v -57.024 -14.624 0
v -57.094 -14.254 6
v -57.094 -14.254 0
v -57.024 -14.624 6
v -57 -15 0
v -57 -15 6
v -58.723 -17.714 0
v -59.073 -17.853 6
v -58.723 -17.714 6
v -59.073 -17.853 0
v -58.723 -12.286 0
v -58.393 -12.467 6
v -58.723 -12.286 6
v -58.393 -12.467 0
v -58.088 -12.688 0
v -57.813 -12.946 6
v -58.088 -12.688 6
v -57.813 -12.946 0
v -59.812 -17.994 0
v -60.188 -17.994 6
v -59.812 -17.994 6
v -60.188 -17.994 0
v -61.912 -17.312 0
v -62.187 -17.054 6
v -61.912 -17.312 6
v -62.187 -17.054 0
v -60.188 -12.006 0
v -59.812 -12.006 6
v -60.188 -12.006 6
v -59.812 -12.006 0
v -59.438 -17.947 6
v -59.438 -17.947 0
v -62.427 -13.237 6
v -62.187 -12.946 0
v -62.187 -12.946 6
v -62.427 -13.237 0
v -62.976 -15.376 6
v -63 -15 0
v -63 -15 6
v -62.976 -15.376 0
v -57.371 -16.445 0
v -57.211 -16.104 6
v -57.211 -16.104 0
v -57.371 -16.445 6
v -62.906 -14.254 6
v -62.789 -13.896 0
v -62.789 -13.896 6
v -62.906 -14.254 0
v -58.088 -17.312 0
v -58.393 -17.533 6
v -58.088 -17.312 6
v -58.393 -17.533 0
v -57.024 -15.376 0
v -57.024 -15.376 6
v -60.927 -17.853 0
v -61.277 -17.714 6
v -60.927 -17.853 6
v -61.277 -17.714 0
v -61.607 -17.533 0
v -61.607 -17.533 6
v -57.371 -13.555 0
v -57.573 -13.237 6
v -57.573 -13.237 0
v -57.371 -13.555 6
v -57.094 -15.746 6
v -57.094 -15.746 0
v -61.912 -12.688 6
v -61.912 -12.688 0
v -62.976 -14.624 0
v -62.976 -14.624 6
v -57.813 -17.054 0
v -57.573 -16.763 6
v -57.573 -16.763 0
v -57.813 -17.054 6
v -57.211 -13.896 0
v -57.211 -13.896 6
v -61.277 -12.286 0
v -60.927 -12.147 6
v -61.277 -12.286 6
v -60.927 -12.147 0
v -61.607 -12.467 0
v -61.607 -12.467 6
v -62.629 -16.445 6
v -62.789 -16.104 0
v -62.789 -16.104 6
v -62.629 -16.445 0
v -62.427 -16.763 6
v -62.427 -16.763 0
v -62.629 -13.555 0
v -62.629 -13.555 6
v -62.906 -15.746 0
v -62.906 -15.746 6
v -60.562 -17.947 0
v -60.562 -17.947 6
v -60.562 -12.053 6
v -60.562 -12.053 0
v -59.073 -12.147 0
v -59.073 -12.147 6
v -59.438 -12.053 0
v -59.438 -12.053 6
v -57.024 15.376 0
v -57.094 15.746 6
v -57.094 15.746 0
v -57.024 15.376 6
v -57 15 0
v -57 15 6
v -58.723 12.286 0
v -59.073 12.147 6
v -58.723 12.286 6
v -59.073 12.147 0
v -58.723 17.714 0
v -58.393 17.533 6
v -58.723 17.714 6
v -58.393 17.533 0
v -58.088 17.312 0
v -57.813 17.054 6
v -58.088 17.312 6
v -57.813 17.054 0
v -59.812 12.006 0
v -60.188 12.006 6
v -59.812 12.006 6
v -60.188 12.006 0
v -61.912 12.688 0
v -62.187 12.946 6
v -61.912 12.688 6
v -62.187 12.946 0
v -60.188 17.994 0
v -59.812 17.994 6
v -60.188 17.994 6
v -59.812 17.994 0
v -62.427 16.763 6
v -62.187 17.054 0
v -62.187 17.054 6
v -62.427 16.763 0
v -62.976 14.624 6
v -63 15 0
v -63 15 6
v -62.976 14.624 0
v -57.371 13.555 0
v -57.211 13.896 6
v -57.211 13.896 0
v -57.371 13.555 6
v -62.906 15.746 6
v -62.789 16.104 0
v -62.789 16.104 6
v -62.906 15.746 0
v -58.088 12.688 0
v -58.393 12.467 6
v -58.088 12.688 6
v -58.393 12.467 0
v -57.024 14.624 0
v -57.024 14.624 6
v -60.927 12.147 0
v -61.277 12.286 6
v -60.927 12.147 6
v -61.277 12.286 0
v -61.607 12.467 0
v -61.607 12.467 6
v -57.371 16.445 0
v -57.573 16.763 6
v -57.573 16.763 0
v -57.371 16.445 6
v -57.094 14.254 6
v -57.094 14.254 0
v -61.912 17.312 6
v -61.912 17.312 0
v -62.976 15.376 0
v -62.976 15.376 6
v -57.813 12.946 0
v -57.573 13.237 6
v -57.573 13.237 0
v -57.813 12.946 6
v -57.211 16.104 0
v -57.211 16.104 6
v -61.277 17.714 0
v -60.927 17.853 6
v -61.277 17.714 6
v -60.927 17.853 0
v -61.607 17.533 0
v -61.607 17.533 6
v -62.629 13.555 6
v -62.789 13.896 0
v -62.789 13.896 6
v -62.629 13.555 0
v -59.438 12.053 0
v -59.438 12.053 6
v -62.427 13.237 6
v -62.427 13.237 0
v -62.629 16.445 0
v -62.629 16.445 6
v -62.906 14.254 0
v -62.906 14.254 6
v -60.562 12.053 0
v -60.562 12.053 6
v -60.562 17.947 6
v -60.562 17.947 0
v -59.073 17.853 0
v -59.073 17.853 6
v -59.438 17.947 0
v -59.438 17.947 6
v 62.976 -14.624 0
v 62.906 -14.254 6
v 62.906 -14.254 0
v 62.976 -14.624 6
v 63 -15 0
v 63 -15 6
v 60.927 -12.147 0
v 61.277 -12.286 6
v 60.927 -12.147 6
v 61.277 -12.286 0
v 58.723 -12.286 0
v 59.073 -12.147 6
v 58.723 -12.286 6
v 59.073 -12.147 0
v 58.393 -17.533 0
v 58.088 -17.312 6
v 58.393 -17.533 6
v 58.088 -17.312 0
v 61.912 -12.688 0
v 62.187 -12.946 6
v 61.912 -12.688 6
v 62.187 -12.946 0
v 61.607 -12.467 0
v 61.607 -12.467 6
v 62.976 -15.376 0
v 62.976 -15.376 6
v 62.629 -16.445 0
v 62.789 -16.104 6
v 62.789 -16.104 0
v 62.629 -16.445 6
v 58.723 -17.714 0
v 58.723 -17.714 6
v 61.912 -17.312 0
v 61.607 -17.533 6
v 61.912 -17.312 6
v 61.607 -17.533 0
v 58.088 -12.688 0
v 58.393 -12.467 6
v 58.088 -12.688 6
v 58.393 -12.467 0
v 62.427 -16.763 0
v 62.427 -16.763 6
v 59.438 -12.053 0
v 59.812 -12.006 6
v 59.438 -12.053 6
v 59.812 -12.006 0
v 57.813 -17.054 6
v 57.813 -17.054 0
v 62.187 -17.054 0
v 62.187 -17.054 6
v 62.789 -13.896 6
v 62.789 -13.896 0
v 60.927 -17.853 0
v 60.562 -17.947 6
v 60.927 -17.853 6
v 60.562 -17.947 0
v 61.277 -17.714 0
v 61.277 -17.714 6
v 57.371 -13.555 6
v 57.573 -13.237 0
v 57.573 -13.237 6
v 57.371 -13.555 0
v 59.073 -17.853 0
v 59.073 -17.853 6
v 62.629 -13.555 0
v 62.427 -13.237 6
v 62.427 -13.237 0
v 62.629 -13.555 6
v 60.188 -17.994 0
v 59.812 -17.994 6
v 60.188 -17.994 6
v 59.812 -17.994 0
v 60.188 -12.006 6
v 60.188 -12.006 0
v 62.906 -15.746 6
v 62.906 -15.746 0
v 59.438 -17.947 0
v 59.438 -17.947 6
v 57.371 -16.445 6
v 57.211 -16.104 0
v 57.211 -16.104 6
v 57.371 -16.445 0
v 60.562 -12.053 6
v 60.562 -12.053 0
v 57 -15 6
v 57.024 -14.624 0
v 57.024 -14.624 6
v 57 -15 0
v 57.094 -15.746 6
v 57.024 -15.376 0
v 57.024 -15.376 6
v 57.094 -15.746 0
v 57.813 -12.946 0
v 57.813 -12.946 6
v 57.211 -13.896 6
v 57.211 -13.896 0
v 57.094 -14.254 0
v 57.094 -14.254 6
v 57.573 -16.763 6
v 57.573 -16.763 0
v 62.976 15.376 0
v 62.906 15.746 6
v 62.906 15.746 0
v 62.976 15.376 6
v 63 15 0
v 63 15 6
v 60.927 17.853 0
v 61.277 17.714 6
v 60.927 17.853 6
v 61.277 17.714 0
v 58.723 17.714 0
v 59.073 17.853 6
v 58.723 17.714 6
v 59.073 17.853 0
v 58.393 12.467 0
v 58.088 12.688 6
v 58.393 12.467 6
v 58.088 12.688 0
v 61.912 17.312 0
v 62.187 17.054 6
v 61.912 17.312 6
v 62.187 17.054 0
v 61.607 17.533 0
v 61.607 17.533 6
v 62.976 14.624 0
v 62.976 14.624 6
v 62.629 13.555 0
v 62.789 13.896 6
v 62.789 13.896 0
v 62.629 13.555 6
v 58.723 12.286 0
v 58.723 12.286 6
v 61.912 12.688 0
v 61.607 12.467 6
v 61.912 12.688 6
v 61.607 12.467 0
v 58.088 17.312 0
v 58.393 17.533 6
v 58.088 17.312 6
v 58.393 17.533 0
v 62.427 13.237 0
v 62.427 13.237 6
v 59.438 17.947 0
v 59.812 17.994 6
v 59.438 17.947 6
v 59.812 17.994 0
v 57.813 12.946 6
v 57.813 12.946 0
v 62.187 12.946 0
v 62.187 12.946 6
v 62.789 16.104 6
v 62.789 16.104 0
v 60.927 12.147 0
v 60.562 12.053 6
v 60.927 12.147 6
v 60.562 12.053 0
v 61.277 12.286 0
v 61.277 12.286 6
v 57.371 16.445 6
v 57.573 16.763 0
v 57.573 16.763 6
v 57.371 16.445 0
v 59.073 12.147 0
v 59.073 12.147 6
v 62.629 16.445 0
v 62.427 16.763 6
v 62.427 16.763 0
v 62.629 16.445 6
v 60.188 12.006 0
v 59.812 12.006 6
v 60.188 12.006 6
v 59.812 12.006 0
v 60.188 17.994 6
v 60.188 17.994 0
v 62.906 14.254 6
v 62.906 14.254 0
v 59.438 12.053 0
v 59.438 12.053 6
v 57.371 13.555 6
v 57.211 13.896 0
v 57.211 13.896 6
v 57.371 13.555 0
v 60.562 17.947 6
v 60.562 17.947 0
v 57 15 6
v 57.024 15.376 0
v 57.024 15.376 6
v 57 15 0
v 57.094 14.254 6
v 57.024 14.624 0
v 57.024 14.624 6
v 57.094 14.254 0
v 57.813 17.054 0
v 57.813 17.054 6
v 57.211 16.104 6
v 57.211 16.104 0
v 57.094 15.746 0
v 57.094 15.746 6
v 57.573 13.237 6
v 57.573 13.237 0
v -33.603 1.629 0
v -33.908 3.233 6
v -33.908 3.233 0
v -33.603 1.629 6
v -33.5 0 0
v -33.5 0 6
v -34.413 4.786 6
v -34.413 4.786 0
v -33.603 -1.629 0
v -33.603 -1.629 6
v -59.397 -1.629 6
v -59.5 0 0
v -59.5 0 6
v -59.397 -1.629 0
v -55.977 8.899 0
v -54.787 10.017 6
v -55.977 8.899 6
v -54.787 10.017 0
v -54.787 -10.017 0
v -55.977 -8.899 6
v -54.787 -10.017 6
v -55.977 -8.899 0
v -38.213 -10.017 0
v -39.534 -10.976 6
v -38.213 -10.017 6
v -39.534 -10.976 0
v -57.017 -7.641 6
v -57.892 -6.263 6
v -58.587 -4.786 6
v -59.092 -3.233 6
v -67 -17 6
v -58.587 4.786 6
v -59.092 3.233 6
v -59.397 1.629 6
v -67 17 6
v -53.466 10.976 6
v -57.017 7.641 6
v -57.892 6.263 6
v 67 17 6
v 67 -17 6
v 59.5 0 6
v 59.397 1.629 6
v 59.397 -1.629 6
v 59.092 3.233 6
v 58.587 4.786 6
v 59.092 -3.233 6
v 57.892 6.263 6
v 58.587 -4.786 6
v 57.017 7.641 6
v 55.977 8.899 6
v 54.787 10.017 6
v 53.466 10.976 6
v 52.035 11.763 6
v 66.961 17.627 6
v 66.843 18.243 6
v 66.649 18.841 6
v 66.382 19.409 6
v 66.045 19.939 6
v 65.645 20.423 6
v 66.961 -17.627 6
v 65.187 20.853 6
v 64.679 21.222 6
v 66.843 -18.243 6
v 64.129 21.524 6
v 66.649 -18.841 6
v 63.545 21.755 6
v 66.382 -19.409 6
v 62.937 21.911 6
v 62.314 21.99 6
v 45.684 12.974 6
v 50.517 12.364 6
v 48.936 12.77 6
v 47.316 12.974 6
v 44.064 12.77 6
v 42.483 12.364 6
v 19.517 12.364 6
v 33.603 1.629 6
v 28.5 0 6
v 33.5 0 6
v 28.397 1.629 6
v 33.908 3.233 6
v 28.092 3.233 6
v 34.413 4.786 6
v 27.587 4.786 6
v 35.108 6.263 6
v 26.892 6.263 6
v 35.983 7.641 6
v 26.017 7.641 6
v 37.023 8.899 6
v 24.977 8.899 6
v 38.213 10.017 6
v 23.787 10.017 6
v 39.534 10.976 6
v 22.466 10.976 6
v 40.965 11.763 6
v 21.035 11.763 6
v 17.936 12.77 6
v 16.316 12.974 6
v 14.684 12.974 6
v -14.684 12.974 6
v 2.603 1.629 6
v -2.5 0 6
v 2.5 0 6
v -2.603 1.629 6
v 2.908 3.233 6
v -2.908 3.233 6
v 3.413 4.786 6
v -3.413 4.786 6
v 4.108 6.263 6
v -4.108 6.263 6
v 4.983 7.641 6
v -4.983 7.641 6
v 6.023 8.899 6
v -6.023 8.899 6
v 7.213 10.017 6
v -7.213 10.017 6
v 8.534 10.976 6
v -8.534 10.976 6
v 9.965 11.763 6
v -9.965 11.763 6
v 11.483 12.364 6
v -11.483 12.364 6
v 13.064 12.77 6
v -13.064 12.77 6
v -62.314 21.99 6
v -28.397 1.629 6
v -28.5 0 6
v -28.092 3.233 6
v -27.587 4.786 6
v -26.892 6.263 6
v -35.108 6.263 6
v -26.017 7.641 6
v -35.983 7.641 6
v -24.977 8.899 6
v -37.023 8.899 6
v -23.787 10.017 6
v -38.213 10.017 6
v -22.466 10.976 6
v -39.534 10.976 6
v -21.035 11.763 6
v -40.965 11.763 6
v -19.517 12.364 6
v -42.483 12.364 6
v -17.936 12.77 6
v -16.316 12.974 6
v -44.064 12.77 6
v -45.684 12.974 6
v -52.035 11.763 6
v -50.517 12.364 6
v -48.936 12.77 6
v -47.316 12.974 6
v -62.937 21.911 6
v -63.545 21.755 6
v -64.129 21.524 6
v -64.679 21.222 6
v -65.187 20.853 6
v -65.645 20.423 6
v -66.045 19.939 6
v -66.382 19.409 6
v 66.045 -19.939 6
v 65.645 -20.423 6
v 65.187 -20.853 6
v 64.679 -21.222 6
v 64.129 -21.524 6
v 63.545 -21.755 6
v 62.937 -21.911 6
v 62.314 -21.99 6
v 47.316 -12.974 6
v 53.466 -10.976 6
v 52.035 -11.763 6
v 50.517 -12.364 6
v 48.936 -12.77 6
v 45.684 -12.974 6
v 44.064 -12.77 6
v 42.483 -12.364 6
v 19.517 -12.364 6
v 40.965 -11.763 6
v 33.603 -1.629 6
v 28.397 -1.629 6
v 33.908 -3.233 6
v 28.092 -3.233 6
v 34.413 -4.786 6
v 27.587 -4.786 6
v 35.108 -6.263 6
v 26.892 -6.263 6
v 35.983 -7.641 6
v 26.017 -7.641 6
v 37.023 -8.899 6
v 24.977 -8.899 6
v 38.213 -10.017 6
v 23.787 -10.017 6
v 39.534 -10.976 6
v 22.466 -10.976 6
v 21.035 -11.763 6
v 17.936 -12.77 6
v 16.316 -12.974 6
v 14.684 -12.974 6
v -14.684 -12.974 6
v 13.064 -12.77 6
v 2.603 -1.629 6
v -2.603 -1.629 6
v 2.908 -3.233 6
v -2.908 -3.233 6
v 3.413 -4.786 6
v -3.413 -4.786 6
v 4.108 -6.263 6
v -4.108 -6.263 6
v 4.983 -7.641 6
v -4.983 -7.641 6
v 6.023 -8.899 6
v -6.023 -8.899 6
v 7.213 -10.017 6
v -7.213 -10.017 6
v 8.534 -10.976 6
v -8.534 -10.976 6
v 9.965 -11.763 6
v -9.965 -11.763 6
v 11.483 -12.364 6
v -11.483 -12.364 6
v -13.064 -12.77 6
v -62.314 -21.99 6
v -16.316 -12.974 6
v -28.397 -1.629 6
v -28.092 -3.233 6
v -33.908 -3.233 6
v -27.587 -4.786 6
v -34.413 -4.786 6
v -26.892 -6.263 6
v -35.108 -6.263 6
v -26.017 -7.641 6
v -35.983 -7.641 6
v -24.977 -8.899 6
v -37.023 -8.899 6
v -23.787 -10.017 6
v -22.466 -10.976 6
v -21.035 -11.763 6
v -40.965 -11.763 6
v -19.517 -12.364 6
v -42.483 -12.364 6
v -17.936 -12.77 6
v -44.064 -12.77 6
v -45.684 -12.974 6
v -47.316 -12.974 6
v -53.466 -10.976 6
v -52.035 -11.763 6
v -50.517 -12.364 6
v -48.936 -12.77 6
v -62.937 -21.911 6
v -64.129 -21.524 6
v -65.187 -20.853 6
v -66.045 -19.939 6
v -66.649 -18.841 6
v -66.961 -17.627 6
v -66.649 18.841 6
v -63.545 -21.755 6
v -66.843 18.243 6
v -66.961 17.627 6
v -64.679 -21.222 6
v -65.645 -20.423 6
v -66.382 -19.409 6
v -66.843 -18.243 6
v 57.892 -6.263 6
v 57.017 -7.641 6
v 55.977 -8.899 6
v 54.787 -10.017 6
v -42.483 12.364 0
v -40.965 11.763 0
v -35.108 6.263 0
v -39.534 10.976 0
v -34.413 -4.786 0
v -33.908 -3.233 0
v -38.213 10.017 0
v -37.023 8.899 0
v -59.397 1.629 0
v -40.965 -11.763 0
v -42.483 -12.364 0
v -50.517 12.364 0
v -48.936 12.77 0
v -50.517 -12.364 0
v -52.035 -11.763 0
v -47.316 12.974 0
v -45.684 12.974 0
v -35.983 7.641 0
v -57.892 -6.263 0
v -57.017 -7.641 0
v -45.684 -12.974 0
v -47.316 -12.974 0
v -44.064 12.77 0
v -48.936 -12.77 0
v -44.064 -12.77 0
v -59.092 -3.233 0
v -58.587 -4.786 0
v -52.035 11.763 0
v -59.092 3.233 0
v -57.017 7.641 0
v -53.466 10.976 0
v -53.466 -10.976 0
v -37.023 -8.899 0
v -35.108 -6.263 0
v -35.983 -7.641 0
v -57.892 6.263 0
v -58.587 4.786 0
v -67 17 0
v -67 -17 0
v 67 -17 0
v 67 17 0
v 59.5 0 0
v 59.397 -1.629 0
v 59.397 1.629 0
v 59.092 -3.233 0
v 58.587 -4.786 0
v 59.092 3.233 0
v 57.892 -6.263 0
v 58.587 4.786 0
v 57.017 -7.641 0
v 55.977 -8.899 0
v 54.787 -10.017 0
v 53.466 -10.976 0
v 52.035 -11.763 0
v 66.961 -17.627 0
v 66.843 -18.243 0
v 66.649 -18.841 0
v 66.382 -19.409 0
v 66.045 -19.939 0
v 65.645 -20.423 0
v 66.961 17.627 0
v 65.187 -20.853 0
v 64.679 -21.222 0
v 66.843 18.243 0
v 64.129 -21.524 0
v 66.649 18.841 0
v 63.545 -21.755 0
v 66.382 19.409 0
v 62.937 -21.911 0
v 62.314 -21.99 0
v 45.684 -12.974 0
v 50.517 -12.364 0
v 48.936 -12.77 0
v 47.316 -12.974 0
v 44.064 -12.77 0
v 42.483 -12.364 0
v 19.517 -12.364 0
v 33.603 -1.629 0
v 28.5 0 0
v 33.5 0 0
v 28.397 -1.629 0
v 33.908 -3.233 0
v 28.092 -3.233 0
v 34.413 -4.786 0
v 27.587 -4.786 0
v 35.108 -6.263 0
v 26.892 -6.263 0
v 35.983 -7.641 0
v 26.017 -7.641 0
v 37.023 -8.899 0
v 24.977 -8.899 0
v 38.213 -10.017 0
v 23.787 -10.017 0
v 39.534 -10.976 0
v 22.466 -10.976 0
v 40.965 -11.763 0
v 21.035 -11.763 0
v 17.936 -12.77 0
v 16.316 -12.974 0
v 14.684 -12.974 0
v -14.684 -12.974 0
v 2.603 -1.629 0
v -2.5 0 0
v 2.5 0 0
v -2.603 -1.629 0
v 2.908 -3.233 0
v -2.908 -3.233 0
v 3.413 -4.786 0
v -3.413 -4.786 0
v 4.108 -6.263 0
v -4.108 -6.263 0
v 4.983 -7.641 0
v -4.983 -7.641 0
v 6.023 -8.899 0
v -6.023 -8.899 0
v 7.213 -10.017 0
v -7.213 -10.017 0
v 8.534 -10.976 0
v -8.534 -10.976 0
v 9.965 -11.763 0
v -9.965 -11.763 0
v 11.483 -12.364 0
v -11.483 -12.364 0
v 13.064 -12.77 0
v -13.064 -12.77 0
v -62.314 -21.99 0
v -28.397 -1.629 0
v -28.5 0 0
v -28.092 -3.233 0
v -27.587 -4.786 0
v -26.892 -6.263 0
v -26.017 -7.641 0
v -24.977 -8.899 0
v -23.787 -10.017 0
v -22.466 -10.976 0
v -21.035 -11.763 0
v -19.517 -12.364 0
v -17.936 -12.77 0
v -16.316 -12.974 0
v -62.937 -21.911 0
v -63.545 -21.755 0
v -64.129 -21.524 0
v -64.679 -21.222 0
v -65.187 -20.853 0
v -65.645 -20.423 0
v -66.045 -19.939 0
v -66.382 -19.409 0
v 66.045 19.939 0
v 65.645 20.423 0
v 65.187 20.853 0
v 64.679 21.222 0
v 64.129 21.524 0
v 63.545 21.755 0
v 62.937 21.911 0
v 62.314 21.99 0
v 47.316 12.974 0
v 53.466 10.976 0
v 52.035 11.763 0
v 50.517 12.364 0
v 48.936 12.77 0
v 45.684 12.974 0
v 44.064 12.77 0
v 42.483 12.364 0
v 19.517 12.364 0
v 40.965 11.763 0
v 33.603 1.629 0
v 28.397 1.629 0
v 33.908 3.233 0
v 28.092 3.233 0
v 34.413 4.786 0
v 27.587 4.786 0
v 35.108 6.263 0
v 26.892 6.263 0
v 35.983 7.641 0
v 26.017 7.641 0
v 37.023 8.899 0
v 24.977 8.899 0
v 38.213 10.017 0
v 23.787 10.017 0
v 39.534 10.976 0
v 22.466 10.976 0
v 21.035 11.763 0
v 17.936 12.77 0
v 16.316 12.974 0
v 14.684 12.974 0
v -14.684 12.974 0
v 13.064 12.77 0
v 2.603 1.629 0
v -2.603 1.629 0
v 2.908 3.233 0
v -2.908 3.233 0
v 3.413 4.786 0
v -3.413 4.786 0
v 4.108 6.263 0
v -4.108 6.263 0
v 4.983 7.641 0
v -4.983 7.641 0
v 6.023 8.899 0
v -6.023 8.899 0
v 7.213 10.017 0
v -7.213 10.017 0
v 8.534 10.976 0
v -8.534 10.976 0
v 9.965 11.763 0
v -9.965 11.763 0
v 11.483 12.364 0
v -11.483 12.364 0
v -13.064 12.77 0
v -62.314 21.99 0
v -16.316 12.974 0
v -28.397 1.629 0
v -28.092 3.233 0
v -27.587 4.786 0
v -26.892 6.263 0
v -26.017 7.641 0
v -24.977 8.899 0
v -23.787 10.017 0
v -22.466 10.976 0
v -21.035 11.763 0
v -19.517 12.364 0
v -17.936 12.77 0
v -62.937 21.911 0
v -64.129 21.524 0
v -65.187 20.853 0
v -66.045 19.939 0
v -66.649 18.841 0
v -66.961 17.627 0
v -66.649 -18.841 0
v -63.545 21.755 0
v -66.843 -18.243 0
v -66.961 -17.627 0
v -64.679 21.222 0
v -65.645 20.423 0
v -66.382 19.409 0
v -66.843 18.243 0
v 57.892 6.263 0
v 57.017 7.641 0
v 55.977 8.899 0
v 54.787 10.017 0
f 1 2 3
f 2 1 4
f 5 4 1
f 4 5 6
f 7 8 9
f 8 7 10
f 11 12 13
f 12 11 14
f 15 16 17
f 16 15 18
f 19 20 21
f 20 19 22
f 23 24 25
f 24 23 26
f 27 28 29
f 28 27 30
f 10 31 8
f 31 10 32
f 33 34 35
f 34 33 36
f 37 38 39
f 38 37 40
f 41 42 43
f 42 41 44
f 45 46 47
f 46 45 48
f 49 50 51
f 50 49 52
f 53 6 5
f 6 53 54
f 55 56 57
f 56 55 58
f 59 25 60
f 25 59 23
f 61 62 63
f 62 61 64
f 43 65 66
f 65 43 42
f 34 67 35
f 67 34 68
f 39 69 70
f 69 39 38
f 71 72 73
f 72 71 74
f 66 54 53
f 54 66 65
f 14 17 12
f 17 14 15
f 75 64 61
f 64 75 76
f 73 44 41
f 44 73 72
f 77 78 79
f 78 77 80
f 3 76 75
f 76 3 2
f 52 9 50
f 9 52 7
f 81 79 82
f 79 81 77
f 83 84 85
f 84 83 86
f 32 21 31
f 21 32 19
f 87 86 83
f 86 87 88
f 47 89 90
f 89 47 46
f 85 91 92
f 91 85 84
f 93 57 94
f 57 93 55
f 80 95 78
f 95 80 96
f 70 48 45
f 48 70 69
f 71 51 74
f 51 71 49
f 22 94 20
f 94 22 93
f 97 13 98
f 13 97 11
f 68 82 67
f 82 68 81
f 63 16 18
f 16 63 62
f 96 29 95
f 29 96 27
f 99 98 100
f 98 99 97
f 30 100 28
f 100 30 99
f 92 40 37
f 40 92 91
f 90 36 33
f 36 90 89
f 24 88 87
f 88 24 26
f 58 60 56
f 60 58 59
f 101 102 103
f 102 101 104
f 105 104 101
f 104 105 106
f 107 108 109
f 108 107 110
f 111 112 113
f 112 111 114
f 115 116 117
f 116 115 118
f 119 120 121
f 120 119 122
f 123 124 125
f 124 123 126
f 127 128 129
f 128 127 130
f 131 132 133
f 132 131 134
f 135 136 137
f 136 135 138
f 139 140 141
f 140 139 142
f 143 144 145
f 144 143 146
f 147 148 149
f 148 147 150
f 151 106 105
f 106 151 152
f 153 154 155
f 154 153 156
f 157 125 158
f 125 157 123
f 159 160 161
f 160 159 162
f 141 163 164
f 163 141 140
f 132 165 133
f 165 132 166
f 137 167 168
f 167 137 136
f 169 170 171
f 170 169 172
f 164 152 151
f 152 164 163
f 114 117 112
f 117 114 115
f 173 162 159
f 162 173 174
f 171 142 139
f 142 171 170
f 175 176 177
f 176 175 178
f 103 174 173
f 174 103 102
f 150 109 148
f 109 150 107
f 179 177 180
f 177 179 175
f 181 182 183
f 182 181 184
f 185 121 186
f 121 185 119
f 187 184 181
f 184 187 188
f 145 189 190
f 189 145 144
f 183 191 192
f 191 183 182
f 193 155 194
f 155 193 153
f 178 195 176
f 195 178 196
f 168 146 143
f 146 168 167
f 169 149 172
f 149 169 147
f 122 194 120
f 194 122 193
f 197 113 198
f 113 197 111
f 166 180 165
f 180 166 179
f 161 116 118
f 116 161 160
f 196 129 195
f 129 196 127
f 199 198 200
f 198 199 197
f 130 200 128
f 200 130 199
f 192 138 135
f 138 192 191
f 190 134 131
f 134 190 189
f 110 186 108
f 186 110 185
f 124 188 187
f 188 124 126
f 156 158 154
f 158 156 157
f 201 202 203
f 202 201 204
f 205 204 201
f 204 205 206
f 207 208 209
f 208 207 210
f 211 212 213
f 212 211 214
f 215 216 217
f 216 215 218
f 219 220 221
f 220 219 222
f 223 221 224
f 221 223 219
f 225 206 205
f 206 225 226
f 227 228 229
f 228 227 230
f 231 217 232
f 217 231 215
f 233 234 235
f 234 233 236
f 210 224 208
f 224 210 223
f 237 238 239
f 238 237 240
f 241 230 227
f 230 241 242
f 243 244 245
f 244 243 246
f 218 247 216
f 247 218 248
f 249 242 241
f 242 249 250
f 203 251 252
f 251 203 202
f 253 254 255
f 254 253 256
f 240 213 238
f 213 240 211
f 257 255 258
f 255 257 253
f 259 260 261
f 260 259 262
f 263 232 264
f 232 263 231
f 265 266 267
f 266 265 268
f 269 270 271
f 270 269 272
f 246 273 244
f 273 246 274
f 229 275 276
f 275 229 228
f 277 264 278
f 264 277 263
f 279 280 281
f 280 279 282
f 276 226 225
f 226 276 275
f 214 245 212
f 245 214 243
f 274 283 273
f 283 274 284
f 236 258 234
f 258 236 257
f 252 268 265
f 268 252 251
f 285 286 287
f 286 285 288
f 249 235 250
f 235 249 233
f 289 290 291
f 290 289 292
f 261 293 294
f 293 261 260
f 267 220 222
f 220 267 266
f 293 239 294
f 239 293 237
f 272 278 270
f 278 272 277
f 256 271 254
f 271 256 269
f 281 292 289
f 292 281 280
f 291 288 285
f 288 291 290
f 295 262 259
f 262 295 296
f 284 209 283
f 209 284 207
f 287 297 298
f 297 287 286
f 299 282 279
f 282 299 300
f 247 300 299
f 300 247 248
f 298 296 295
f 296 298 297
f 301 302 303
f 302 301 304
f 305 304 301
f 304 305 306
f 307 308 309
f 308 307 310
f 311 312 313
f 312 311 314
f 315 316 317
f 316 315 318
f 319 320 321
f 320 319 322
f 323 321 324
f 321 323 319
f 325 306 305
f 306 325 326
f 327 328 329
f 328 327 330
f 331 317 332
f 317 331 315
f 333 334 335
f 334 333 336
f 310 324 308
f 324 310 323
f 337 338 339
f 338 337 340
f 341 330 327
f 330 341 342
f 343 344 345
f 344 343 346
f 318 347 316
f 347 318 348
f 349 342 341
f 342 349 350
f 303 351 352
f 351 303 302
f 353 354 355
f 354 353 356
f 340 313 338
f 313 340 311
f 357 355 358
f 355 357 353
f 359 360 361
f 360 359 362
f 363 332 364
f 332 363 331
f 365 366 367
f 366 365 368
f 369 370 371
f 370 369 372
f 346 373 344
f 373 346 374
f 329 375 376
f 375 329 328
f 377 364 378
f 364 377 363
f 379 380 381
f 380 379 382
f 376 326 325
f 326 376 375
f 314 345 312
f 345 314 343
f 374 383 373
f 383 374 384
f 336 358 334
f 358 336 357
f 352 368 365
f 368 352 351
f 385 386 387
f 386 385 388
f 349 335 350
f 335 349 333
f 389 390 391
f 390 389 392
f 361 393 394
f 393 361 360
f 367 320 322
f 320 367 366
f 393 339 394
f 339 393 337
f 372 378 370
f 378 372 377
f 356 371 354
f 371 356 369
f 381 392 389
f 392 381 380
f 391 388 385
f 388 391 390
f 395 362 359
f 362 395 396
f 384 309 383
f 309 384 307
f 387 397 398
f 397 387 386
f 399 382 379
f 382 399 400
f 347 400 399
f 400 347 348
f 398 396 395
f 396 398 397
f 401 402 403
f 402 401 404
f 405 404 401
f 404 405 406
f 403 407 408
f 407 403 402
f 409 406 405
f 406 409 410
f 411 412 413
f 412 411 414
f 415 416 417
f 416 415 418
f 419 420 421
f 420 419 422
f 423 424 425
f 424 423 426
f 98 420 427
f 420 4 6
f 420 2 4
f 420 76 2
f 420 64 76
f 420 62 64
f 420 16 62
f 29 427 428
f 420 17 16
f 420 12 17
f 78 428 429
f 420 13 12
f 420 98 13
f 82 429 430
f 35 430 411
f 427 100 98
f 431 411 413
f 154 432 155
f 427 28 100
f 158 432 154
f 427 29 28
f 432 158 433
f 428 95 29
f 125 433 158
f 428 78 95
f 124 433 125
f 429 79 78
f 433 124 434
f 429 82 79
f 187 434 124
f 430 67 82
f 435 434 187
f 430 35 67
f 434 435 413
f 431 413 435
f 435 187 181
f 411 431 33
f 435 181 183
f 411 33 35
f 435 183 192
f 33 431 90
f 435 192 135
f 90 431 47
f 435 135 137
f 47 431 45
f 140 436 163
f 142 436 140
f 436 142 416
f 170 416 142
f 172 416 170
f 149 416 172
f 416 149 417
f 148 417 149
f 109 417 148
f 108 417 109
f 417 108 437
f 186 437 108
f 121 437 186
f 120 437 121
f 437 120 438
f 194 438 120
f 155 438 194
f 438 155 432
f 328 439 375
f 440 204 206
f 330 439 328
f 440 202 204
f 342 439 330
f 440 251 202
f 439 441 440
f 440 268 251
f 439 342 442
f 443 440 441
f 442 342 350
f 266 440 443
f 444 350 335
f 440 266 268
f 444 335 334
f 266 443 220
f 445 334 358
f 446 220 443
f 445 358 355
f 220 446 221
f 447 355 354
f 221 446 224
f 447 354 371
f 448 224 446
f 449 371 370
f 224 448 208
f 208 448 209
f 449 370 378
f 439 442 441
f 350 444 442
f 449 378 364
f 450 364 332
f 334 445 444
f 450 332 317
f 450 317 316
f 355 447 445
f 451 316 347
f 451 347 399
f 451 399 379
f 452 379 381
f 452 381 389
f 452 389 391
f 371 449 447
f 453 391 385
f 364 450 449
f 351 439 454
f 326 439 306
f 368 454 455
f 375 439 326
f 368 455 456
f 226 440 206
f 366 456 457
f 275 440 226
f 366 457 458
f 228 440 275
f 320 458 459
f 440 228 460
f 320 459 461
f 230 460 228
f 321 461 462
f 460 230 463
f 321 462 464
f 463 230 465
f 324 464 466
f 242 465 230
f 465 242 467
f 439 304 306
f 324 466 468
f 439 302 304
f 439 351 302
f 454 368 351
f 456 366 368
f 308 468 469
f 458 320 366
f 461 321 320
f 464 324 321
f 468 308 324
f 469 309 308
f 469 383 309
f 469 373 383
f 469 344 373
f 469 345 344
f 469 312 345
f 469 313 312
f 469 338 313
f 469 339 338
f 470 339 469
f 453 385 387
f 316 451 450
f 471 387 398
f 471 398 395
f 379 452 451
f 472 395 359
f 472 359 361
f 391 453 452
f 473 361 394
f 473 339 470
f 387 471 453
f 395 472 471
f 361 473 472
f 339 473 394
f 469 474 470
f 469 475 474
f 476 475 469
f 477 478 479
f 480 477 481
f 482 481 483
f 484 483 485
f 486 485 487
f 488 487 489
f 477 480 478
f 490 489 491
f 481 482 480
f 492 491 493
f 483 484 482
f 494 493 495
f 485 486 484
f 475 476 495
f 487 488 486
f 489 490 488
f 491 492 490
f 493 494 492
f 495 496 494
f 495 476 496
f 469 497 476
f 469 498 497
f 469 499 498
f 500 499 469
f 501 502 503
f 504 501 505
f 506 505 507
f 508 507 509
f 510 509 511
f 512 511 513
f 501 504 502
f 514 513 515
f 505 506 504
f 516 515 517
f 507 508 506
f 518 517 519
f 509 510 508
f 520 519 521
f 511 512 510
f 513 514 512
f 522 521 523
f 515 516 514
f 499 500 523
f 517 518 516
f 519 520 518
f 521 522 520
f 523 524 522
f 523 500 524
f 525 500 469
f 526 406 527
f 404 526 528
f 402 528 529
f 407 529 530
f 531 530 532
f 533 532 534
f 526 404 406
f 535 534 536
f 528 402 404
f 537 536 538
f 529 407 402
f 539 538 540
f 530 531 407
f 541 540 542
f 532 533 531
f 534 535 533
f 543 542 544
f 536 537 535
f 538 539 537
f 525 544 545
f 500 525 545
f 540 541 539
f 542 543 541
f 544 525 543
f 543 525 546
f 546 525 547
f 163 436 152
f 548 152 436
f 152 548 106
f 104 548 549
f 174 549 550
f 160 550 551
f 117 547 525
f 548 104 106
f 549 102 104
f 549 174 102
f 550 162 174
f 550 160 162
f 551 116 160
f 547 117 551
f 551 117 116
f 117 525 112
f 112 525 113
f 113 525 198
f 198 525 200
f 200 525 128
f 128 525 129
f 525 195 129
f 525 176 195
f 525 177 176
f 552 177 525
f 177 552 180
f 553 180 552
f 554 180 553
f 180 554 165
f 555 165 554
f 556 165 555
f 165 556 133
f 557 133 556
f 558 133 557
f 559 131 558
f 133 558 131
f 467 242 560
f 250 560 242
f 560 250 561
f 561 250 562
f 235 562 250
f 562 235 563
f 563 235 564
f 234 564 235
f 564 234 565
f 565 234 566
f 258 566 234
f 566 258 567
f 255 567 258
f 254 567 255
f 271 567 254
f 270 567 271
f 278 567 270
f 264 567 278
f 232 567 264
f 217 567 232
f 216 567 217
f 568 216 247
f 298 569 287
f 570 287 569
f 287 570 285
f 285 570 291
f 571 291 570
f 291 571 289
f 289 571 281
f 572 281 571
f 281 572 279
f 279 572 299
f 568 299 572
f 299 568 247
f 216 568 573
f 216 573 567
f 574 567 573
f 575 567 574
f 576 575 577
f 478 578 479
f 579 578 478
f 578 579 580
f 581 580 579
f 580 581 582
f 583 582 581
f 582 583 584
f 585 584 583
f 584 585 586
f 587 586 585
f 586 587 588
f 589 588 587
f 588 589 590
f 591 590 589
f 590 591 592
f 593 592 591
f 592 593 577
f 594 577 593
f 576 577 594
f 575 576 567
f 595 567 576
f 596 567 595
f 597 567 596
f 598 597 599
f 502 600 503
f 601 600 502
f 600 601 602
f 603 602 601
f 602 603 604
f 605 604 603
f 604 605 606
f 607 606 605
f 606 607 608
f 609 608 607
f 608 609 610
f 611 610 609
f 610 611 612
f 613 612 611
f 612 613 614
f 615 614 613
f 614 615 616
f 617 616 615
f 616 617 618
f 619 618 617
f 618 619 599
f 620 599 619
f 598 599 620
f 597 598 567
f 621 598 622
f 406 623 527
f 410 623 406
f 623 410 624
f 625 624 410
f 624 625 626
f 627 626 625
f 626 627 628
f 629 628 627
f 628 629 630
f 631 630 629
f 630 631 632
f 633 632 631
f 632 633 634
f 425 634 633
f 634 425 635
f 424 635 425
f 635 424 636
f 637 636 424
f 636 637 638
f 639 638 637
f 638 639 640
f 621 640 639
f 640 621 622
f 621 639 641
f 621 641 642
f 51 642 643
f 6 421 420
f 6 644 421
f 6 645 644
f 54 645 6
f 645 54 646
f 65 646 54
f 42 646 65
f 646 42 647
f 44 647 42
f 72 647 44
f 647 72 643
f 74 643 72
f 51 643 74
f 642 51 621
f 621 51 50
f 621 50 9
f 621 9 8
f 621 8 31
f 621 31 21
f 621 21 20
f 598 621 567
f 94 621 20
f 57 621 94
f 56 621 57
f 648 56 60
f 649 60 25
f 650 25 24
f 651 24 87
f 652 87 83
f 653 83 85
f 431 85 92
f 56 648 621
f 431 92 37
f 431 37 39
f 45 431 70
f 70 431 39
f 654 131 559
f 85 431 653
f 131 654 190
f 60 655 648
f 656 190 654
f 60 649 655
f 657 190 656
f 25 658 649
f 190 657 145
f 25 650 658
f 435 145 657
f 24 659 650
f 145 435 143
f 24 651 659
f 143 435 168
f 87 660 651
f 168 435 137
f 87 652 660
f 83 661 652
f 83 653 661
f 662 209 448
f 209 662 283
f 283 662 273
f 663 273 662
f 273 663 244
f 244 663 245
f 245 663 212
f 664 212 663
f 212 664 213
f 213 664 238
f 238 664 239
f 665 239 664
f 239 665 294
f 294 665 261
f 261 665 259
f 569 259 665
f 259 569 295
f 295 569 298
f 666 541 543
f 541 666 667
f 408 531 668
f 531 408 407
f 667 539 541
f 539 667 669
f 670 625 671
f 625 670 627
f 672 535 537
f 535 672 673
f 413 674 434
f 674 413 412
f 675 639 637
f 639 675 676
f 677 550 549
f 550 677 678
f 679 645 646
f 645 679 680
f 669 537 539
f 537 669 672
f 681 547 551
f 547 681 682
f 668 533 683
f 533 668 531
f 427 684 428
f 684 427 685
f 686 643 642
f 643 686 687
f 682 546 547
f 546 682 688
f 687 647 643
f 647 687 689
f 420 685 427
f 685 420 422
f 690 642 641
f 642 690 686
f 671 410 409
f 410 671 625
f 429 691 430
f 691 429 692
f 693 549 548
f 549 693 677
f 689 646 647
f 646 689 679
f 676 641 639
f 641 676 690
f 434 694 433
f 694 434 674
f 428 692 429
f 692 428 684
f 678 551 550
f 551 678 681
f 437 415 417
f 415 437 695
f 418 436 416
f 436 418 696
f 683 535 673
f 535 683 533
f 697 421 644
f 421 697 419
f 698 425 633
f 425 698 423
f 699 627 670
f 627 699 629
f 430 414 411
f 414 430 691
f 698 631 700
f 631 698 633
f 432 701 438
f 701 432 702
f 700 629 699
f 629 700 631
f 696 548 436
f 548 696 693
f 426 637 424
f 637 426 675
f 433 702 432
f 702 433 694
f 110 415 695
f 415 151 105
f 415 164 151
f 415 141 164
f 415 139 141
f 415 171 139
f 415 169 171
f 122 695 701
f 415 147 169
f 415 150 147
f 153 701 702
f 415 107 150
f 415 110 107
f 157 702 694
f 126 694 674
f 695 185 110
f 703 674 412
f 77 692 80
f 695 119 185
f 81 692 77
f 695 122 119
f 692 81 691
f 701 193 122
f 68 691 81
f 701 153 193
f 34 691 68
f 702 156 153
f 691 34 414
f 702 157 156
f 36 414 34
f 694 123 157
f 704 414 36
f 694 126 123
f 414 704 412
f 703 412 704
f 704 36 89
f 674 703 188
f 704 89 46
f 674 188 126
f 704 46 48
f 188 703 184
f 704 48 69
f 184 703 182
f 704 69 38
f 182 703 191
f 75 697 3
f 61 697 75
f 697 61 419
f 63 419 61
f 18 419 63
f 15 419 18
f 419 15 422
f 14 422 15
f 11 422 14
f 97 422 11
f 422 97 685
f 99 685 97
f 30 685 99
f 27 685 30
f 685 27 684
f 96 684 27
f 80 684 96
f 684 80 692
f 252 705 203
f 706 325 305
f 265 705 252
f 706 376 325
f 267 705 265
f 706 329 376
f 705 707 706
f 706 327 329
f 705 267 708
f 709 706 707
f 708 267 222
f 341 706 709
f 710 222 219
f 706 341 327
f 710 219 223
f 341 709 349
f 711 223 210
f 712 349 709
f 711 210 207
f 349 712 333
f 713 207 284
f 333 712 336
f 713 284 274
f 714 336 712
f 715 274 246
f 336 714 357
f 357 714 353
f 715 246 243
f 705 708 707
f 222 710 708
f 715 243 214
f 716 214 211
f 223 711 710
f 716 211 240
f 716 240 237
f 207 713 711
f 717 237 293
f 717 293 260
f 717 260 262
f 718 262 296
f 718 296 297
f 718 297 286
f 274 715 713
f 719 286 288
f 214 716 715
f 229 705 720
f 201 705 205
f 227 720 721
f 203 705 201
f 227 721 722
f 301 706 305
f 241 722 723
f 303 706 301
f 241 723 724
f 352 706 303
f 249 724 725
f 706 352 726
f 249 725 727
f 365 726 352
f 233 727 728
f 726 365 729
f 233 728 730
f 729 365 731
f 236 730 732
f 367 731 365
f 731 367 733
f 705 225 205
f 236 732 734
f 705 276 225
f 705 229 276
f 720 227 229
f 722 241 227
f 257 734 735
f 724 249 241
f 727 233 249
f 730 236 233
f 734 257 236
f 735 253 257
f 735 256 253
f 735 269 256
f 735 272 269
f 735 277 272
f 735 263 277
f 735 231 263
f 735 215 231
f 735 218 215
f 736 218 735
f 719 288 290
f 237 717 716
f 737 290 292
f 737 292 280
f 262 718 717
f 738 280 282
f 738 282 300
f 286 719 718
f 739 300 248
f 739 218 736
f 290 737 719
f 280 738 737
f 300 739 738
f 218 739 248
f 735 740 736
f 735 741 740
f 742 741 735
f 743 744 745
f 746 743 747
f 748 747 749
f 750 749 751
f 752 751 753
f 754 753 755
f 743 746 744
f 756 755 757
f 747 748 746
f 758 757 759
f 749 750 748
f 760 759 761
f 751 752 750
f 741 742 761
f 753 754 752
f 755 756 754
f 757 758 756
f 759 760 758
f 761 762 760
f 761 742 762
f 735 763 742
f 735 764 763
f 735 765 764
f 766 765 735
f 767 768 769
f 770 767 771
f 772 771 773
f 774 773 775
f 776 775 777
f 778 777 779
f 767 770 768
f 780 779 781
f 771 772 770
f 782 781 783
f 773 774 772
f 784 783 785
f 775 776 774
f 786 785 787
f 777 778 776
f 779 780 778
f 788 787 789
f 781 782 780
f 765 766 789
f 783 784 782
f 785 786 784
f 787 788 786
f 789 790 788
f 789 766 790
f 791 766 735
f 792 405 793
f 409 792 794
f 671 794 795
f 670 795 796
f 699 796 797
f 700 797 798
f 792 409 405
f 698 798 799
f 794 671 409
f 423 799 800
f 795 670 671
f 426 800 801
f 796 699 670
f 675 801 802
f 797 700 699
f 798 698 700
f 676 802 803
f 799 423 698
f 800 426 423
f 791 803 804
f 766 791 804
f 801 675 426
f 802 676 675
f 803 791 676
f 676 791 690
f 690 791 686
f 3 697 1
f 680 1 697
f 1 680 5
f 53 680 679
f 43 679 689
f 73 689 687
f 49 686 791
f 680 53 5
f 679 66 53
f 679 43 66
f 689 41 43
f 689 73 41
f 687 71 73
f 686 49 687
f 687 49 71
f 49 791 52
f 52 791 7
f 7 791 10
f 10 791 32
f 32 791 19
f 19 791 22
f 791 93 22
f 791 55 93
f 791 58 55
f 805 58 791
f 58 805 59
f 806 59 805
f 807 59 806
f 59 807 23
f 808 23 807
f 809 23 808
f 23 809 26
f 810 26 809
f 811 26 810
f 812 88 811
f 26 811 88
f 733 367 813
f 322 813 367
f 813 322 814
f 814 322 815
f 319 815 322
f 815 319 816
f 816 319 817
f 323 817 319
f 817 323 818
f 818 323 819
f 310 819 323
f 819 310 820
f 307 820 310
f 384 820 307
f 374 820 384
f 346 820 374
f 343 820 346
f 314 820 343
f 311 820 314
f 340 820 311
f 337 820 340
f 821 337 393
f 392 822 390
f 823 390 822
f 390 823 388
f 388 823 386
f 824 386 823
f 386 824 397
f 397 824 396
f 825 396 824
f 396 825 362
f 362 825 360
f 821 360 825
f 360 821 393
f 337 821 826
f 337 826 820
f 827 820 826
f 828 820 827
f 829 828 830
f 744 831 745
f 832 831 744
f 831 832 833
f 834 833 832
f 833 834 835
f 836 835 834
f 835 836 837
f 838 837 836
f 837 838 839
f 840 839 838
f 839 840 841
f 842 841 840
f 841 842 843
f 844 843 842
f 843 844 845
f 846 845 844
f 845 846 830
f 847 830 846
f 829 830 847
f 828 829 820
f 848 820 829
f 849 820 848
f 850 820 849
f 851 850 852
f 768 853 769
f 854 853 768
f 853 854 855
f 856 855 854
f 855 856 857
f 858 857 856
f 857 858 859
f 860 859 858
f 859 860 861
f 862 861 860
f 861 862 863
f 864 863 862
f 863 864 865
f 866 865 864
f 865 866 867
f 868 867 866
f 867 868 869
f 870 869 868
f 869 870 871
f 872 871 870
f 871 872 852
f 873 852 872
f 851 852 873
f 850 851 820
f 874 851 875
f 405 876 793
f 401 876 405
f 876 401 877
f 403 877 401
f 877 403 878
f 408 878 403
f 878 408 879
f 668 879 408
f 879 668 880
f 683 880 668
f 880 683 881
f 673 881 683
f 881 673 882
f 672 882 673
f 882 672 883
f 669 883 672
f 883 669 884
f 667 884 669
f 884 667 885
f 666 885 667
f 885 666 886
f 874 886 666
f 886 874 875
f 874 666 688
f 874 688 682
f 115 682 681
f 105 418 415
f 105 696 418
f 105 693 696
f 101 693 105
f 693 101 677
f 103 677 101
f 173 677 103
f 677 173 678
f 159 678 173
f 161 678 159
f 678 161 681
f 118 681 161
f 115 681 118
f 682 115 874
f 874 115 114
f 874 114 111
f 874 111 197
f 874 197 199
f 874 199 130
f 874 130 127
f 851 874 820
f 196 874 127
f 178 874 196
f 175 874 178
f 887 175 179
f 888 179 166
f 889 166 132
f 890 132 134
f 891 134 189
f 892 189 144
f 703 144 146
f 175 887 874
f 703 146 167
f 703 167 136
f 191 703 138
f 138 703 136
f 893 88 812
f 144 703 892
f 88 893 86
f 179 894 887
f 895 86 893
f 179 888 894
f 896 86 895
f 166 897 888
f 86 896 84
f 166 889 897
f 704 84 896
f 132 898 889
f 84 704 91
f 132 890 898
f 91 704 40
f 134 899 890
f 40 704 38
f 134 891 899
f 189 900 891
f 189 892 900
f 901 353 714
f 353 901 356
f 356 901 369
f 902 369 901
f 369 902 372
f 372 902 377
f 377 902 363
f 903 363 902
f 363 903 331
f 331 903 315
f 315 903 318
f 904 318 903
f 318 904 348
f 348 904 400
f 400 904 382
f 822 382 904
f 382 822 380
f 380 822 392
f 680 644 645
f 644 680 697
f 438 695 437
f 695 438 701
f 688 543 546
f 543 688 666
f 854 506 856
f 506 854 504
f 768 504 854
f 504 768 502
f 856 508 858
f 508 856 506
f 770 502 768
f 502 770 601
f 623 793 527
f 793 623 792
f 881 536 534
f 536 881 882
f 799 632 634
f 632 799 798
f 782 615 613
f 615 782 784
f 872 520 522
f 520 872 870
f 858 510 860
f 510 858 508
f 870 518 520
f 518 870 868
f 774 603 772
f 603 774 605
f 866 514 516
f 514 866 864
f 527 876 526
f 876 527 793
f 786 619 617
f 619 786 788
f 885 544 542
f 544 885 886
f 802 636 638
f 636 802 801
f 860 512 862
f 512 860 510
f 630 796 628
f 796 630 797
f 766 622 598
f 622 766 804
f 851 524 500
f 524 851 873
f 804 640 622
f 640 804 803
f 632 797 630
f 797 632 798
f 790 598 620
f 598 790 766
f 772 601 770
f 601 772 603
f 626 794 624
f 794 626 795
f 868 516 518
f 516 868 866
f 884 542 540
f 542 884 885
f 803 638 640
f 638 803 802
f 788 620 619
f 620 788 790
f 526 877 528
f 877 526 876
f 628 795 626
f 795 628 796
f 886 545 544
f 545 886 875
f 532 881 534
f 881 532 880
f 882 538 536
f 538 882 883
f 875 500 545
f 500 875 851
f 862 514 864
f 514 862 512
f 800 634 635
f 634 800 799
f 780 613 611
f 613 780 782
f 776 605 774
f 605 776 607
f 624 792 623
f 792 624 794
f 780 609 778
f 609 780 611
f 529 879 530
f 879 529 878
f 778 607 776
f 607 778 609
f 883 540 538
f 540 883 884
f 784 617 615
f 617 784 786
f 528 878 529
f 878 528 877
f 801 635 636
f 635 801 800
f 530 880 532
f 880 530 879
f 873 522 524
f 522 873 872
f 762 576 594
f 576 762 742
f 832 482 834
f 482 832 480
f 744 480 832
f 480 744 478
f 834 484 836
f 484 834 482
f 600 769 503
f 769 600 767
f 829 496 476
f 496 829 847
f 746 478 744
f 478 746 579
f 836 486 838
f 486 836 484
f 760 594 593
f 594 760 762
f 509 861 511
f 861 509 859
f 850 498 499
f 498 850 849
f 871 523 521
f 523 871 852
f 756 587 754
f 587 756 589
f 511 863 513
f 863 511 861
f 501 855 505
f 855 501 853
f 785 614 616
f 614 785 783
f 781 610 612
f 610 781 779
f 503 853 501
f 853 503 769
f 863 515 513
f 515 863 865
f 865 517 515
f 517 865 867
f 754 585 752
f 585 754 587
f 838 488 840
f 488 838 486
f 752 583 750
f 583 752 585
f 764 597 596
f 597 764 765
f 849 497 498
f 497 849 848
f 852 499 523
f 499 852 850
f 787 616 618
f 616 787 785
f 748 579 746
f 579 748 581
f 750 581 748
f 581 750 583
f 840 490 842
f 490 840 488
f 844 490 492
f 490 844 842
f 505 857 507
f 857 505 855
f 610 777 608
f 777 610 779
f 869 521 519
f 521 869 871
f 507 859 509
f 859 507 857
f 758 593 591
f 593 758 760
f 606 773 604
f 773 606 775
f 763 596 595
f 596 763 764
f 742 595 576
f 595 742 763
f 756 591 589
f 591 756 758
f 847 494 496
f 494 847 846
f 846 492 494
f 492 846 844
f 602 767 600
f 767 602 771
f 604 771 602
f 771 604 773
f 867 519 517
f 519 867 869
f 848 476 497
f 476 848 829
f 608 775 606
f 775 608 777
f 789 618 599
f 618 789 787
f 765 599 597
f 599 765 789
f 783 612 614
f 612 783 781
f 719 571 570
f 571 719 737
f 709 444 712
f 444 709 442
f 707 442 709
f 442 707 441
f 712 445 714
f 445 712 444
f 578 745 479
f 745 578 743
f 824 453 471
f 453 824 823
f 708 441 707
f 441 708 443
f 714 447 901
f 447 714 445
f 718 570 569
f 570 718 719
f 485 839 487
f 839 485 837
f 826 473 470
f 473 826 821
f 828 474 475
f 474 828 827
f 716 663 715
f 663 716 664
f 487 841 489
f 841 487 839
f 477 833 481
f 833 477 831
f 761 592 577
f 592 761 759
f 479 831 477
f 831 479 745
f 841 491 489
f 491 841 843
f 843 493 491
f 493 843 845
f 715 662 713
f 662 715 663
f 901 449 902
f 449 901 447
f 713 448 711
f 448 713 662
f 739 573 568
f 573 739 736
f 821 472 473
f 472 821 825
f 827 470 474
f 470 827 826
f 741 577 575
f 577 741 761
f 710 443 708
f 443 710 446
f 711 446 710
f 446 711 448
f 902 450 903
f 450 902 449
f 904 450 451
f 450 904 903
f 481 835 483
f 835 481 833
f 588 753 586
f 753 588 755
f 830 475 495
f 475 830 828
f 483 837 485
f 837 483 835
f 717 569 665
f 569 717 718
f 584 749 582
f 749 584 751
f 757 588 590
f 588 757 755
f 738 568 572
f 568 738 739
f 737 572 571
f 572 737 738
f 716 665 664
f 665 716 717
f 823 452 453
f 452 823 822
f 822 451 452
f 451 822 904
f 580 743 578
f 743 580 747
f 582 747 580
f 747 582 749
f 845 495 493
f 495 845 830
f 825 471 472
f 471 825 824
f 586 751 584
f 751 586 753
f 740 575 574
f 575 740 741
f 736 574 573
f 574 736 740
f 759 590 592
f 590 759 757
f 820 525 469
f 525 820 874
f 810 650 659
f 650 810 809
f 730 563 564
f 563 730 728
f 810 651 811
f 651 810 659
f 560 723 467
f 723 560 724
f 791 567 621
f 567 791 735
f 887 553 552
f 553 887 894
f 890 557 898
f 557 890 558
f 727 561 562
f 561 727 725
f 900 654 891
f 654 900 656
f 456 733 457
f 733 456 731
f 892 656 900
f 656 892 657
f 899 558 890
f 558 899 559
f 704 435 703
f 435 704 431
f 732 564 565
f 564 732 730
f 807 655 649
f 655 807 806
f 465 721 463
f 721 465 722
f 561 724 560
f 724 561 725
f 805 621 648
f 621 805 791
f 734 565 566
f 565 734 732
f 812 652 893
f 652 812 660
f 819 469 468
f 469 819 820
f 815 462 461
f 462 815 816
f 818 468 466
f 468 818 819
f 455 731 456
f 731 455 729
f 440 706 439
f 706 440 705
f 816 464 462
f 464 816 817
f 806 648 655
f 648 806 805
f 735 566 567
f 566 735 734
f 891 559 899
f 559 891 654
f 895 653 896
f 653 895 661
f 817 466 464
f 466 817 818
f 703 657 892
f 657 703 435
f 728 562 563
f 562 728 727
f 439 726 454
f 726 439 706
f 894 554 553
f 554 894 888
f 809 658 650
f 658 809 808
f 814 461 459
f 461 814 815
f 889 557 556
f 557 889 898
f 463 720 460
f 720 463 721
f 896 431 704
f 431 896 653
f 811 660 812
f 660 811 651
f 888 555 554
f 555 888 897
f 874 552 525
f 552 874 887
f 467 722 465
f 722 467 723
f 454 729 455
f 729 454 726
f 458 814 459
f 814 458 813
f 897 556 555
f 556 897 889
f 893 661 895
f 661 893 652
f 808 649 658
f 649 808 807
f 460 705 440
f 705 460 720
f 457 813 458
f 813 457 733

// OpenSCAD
$fn = 50;


difference() {
	union() {
		hull() {
			translate(v = [-62.0000000000, 17.0000000000, 0]) {
				cylinder(h = 6, r = 5);
			}
			translate(v = [62.0000000000, 17.0000000000, 0]) {
				cylinder(h = 6, r = 5);
			}
			translate(v = [-62.0000000000, -17.0000000000, 0]) {
				cylinder(h = 6, r = 5);
			}
			translate(v = [62.0000000000, -17.0000000000, 0]) {
				cylinder(h = 6, r = 5);
			}
		}
	}
	union() {
		#translate(v = [-60.0000000000, -15.0000000000, -100.0000000000]) {
			cylinder(h = 200, r = 3.0000000000);
		}
		#translate(v = [-60.0000000000, 15.0000000000, -100.0000000000]) {
			cylinder(h = 200, r = 3.0000000000);
		}
		#translate(v = [60.0000000000, -15.0000000000, -100.0000000000]) {
			cylinder(h = 200, r = 3.0000000000);
		}
		#translate(v = [60.0000000000, 15.0000000000, -100.0000000000]) {
			cylinder(h = 200, r = 3.0000000000);
		}
		#translate(v = [-46.5000000000, 0, 0]) {
			cylinder(h = 6, r = 13.0000000000);
		}
		#translate(v = [-15.5000000000, 0, 0]) {
			cylinder(h = 6, r = 13.0000000000);
		}
		#translate(v = [15.5000000000, 0, 0]) {
			cylinder(h = 6, r = 13.0000000000);
		}
		#translate(v = [46.5000000000, 0, 0]) {
			cylinder(h = 6, r = 13.0000000000);
		}
	}
}
